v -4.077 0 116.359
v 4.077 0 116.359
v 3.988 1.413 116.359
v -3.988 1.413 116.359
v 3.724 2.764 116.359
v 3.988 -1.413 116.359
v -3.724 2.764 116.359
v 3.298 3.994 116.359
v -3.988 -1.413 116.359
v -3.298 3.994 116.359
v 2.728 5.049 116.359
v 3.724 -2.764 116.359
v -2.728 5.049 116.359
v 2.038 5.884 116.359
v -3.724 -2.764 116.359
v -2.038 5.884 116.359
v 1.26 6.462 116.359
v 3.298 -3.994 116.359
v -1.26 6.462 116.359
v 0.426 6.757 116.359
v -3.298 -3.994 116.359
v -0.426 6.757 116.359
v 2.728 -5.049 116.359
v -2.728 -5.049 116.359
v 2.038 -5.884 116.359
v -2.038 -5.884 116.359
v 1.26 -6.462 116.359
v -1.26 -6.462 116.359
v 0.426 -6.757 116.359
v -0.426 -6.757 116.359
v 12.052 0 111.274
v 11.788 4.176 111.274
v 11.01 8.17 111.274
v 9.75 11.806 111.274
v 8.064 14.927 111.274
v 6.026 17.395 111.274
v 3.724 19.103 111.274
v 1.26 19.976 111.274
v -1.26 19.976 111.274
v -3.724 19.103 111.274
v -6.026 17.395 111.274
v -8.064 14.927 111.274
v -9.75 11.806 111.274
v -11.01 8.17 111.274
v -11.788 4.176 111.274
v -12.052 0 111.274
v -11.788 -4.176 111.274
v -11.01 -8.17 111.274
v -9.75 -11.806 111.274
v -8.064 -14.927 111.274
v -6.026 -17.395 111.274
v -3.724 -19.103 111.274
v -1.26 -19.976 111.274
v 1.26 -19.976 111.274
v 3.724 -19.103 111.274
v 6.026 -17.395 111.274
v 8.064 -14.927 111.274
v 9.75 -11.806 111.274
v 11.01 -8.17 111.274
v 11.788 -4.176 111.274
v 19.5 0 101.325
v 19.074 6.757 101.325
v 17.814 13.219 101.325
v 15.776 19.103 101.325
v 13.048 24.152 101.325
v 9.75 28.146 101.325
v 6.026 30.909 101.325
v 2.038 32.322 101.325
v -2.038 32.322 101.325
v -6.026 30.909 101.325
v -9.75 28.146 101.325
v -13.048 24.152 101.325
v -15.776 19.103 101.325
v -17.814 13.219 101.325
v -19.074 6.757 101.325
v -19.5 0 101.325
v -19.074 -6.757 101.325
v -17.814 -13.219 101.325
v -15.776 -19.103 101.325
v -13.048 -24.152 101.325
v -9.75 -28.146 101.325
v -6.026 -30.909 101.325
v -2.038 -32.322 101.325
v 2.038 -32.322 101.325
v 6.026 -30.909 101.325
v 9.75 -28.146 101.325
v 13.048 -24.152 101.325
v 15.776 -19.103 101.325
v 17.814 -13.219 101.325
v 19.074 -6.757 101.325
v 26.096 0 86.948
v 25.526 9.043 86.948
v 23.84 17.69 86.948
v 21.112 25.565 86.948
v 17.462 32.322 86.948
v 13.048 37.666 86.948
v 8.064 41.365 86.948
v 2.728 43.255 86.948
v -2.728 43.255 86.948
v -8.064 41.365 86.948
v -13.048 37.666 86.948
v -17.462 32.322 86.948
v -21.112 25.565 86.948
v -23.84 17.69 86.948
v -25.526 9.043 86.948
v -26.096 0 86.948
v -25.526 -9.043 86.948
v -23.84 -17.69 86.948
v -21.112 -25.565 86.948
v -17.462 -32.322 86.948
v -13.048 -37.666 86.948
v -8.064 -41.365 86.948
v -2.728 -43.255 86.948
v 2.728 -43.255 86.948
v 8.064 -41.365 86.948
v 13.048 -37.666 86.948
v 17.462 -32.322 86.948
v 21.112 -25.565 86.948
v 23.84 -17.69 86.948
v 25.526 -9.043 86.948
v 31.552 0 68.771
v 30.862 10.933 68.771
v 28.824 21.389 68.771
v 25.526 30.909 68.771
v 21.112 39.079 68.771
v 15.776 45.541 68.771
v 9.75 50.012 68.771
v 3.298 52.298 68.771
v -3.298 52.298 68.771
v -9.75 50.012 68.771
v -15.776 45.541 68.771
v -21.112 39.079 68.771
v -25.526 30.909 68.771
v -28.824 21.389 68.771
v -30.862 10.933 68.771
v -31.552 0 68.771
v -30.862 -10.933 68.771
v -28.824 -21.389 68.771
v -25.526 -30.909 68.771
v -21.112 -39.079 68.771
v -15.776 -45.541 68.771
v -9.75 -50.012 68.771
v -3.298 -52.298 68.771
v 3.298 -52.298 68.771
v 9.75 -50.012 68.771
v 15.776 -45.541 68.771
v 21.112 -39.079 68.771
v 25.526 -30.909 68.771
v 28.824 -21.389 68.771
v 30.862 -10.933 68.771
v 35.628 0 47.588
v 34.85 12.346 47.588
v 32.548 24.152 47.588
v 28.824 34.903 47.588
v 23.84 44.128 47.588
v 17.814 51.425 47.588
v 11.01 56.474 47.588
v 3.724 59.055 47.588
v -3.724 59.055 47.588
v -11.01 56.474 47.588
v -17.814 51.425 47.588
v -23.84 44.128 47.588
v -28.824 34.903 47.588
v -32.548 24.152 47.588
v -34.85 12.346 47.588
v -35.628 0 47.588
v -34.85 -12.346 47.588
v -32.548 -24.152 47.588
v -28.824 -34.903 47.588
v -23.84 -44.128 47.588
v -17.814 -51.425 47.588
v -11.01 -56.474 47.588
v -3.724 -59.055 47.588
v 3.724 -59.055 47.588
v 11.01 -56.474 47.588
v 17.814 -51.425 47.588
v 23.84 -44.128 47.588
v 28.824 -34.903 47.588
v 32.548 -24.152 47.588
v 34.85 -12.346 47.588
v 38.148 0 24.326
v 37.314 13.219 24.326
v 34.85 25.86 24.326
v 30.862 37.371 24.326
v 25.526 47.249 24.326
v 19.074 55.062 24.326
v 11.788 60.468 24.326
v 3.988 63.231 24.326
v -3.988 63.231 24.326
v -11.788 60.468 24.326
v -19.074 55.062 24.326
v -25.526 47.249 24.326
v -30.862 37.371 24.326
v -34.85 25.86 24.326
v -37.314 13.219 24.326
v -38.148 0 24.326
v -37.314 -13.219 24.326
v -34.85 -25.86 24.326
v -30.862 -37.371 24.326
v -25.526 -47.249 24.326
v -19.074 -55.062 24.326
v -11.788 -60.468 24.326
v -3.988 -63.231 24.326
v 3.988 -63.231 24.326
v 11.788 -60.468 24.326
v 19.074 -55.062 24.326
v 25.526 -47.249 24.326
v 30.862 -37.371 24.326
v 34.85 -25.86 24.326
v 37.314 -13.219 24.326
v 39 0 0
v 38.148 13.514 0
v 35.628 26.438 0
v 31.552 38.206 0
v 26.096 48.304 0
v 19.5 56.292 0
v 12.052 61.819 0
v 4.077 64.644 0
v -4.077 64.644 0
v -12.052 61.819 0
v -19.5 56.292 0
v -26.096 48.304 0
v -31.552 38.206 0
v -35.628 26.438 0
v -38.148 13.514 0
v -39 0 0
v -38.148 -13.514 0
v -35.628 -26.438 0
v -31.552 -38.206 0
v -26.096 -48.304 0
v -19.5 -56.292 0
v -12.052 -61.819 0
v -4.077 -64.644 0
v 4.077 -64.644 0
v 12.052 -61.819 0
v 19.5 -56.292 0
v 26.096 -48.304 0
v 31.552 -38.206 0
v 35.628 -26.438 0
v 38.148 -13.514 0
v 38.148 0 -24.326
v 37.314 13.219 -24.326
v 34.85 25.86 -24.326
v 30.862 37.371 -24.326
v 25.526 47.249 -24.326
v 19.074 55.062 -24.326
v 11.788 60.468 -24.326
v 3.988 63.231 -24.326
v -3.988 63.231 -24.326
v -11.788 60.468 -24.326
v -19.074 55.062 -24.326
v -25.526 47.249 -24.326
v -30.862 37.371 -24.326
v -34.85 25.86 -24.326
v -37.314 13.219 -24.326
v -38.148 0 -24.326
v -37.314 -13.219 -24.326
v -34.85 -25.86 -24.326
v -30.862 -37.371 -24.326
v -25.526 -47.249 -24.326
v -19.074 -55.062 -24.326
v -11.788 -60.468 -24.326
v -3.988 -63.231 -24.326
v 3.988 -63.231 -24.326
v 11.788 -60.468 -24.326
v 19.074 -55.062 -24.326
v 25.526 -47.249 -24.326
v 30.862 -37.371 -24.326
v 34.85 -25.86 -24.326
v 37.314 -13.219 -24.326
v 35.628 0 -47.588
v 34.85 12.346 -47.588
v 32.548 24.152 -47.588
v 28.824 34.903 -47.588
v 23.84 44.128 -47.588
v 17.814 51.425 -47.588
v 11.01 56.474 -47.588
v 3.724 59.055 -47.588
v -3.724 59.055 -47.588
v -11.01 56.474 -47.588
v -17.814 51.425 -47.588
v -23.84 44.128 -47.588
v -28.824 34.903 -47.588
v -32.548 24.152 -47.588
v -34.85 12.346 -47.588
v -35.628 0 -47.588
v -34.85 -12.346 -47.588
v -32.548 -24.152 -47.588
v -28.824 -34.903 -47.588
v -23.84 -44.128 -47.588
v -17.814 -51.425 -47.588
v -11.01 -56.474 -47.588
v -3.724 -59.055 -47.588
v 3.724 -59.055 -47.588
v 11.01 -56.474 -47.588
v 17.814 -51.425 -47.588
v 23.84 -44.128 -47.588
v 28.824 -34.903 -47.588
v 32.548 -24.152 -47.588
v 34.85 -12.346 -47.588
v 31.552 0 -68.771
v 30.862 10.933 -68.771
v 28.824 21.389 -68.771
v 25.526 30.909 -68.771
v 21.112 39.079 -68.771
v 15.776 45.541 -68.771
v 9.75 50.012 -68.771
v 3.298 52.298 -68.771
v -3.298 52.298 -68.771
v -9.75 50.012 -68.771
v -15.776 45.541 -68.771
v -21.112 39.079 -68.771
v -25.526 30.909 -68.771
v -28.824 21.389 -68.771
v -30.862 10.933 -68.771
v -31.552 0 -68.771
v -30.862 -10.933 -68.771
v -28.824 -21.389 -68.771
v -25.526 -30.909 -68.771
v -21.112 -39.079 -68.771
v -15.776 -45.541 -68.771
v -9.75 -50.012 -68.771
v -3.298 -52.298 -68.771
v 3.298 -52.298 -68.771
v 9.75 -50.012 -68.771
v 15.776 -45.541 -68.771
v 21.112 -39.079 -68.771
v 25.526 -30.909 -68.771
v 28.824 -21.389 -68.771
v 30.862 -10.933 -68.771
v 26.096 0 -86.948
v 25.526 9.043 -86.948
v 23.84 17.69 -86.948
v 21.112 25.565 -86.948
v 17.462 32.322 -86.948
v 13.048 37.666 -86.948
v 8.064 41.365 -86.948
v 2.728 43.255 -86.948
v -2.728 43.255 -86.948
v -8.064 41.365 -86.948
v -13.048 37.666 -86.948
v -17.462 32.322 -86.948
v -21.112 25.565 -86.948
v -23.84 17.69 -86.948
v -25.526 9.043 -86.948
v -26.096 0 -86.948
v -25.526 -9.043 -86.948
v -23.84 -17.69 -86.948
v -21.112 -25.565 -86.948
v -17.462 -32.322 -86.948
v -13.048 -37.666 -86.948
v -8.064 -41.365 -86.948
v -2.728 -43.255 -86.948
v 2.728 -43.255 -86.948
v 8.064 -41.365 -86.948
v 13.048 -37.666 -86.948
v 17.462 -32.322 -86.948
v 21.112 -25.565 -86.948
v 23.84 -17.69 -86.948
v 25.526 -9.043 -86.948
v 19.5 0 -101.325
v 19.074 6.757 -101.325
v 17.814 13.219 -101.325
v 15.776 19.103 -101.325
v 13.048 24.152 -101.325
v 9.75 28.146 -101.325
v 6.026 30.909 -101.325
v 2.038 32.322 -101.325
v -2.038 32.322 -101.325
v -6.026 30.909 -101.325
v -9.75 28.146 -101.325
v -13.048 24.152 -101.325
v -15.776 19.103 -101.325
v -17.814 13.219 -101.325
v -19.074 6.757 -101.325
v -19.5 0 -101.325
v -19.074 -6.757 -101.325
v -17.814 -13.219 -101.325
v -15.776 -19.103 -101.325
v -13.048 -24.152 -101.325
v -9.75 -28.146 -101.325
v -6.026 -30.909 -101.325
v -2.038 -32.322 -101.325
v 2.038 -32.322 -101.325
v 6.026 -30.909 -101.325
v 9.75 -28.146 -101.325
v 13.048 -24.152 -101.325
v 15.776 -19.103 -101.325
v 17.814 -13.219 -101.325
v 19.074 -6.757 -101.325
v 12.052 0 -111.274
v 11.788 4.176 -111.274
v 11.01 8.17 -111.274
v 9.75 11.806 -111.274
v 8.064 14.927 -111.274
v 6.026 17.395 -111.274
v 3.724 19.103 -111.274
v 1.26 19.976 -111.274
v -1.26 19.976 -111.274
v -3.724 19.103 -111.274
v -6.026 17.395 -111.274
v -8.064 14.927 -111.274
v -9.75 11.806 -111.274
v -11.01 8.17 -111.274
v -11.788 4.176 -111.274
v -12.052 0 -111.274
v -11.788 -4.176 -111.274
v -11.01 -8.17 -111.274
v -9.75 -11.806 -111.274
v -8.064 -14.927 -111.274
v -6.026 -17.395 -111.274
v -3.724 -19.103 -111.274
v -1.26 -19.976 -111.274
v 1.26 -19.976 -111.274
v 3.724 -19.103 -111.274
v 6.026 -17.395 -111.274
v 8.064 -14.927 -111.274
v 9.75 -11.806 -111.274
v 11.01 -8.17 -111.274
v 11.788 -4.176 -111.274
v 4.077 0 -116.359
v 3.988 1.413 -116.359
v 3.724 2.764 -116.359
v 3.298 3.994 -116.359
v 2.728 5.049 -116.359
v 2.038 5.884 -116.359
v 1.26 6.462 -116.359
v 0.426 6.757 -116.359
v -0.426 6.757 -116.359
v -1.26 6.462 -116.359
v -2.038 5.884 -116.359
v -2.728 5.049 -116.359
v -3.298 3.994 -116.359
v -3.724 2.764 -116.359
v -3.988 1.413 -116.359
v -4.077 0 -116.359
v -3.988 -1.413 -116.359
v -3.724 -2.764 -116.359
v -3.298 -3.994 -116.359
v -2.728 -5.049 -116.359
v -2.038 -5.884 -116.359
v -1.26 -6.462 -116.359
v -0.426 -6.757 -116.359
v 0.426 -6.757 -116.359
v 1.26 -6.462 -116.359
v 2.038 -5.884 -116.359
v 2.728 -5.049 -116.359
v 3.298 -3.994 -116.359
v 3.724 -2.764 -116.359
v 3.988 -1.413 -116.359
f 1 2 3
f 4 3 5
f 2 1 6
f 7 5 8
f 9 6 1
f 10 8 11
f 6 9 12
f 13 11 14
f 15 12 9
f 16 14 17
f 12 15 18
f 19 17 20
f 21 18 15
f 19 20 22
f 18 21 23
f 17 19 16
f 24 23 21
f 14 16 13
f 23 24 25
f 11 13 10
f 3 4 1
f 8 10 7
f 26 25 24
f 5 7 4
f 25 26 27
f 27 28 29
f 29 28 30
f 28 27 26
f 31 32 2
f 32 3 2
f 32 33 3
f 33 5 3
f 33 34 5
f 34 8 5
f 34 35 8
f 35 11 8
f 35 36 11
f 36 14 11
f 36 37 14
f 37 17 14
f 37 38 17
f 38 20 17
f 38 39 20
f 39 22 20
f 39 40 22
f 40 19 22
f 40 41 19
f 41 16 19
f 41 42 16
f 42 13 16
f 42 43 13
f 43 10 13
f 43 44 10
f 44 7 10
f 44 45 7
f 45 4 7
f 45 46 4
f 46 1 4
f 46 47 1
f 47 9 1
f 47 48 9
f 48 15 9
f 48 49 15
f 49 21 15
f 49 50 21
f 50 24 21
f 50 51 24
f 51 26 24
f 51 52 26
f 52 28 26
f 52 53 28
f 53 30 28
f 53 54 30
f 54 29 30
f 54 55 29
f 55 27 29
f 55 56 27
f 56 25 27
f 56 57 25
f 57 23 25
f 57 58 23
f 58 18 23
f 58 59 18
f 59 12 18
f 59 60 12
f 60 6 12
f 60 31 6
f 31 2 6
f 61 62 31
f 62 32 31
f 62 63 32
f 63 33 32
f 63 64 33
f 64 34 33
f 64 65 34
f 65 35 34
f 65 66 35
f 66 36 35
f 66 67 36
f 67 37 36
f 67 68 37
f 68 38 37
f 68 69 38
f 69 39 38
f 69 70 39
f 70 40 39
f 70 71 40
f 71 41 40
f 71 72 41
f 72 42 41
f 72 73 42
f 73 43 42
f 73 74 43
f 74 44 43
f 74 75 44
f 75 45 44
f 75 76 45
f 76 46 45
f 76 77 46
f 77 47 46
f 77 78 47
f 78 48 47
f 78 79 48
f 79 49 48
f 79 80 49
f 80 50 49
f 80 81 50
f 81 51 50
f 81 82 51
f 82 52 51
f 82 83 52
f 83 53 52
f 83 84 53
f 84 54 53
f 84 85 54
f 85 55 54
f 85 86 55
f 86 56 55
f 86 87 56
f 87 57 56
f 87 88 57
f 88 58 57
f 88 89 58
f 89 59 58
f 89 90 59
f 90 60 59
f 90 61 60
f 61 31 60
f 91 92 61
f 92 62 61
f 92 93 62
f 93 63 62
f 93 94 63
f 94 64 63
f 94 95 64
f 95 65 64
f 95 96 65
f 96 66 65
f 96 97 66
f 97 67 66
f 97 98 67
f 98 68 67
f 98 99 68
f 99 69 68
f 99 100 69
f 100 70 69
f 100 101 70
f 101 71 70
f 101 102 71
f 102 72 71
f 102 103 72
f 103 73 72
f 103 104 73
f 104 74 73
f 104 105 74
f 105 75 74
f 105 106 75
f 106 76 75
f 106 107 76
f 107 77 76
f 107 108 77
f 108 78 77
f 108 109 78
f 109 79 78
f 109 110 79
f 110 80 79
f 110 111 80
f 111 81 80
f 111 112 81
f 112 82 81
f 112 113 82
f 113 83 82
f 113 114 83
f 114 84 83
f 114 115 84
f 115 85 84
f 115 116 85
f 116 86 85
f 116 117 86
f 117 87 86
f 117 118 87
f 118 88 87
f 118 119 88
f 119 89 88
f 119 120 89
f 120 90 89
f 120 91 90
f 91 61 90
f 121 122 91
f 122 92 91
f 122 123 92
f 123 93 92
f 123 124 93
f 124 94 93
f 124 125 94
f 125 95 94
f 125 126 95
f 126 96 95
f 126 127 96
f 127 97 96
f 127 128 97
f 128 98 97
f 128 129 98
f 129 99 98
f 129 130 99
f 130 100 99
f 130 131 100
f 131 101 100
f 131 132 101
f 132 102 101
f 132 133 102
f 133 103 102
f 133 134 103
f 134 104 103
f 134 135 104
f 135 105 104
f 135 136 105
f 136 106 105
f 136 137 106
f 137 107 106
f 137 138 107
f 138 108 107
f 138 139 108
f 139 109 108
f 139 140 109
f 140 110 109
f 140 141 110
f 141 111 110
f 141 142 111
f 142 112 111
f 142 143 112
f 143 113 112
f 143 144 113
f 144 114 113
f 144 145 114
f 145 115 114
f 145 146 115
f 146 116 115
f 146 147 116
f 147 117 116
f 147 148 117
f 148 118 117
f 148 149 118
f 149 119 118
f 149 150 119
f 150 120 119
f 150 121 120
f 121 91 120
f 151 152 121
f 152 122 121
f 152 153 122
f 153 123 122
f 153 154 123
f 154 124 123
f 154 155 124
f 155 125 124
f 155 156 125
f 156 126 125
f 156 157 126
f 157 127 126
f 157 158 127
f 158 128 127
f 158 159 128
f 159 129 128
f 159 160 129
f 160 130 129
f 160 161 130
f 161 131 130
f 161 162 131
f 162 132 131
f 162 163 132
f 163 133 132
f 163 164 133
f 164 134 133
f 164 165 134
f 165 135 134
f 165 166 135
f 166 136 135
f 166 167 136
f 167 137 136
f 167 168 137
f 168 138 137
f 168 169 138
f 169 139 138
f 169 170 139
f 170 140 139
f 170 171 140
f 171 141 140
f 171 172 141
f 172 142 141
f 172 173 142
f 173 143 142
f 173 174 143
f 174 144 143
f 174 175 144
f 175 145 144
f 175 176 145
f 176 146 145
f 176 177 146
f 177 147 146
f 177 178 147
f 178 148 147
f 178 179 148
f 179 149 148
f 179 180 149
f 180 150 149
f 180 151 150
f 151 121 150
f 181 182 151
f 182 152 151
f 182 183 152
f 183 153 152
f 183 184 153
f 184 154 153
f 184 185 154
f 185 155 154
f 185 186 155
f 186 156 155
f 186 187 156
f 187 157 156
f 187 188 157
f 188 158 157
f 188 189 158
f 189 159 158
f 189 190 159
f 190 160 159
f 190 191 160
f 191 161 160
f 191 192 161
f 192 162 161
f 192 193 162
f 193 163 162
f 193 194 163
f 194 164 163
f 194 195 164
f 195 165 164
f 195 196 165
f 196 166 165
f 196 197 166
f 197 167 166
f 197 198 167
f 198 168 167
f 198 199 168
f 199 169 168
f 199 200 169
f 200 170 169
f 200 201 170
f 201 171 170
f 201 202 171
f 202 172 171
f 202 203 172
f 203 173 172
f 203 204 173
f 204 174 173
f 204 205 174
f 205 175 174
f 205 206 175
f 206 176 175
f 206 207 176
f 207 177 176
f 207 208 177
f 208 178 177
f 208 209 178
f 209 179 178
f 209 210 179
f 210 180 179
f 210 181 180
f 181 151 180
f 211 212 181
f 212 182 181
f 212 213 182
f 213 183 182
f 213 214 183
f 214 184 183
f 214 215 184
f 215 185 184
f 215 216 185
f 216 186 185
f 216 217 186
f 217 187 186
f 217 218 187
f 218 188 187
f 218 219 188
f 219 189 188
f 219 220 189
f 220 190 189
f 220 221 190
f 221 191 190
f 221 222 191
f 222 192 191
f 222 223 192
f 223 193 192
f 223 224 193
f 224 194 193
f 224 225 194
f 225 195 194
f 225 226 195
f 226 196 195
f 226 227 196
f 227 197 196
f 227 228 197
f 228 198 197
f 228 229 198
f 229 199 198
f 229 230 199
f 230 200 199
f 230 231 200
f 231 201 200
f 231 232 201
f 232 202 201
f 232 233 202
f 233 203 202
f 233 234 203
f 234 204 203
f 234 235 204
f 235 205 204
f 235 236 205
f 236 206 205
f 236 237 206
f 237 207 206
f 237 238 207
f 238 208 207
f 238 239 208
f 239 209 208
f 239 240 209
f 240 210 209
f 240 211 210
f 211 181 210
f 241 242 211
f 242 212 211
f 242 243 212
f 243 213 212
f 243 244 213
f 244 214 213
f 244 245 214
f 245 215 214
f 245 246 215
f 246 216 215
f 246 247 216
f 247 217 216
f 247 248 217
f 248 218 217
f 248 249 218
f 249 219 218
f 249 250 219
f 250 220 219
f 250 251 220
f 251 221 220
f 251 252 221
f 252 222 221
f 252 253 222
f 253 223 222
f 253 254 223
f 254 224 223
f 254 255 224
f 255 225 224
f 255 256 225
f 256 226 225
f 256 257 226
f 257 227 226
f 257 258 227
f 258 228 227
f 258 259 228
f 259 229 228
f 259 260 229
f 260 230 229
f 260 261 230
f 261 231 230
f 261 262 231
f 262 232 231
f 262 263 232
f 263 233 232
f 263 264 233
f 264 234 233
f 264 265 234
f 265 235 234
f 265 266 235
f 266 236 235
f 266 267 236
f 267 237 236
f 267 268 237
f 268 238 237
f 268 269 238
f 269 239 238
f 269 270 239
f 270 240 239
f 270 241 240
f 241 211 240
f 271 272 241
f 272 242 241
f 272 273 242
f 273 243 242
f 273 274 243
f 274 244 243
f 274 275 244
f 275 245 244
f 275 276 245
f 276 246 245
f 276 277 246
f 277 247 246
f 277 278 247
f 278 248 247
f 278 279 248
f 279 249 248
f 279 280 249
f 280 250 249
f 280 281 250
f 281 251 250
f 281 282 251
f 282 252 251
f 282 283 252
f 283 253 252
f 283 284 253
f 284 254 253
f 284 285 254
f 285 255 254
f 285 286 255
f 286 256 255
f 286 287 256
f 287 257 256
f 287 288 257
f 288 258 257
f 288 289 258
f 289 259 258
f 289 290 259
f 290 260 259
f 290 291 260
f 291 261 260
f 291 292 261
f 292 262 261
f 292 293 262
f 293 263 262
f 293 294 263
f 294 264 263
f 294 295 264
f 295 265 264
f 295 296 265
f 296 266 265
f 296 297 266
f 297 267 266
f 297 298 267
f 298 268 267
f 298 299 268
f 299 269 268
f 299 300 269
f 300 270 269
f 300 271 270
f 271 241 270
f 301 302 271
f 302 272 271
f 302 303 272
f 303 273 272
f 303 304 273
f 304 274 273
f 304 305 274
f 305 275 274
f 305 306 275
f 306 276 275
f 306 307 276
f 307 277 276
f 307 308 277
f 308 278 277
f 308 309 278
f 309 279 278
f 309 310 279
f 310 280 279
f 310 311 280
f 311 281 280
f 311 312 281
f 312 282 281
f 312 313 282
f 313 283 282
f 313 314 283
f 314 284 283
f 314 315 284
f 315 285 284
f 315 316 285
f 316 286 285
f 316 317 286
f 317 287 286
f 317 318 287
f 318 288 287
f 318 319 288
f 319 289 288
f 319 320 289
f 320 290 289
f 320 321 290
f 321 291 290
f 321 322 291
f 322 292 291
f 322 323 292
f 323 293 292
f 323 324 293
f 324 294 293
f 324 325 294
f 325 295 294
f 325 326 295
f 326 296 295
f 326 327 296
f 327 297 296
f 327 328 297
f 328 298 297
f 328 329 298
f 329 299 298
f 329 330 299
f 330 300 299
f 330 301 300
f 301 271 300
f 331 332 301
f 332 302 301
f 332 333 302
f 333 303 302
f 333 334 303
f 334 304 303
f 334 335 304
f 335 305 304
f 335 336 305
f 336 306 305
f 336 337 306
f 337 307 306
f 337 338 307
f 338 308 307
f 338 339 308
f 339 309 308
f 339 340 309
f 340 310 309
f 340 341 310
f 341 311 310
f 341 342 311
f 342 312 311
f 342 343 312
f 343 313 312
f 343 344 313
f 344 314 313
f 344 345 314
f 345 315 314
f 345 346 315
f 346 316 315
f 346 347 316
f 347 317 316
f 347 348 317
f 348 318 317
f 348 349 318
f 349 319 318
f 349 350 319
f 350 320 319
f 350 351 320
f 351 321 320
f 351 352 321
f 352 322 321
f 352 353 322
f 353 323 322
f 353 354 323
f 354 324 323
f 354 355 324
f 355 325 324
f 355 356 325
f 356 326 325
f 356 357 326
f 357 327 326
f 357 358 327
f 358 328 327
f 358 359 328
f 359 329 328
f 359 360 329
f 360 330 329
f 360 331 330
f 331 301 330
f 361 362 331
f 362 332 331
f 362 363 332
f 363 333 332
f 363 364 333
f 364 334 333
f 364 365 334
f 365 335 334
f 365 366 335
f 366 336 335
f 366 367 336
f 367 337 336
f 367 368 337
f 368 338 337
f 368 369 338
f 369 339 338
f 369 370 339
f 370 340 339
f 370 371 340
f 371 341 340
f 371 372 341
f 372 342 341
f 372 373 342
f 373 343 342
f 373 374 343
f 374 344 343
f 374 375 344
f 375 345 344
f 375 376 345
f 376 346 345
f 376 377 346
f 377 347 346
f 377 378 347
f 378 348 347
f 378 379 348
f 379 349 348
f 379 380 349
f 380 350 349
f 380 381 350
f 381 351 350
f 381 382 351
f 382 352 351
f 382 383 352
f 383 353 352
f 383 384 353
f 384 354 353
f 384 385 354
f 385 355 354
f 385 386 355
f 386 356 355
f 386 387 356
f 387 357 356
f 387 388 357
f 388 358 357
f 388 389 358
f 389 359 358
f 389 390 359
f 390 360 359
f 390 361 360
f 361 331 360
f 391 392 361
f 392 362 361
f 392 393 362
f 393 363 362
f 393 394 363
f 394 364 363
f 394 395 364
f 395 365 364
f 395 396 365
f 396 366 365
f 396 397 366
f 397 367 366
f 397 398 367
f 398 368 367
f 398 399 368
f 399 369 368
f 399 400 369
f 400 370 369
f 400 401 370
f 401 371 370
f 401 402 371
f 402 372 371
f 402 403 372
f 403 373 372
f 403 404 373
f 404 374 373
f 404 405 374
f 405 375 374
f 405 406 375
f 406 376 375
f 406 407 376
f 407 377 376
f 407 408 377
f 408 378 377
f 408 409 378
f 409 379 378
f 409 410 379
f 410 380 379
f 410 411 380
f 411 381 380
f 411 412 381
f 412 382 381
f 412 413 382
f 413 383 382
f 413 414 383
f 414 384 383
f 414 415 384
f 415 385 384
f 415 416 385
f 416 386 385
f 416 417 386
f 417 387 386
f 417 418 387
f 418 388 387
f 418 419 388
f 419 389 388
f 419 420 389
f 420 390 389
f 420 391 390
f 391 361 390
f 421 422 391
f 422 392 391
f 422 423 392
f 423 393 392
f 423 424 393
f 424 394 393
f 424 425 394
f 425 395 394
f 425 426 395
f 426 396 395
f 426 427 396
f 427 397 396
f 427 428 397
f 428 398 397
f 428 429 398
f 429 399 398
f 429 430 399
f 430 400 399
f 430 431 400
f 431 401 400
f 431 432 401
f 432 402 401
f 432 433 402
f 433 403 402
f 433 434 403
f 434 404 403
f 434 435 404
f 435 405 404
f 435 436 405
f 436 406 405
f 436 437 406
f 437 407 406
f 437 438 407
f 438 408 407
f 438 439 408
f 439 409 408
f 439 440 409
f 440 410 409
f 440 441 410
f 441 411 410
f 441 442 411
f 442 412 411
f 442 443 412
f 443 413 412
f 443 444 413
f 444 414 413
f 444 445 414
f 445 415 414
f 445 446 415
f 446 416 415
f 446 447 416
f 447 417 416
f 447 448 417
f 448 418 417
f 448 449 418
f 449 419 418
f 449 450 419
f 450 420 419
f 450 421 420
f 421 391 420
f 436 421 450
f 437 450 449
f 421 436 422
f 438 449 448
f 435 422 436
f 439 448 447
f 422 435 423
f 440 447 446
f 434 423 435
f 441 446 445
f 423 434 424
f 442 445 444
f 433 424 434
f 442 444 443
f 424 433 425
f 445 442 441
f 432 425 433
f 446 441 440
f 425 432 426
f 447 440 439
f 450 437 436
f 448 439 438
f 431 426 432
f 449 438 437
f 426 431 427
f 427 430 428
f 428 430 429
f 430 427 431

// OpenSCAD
// Generated by SolidPython 1.0.1 on 2020-07-29 00:46:45


scale(v = [3, 5, 9]) {
	sphere(r = 13);
}
/***********************************************
*********      SolidPython code:      **********
************************************************
 
# import packages: SolidPython
from solid import *
from solid.utils import *
from itertools import chain, combinations, permutations


class Resize:

    def __init__(self, scad_file):
        self.scad_file = scad_file
        #self.scad_file = import_scad(scad_file)
        # cone/cylinder param:
        self.r1 = 0
        self.r2 = 0
        self.h = 0
        # rectangular prism param:
        self.w = 0
        self.l = 0
        # ellipse param:
        self.r = 0

    # import OpenScad code (file name corresponds to shape)


    # classify shape + parameters
    def assign(self, param1, param2, param3):
        if self.scad_file == 'cone.scad':
            self.r1 = param1
            self.r2 = param2
            self.h = param3
        elif self.scad_file == 'cylinder.scad':
            self.r1 = param1
            self.r2 = param2
            self.h = param3
        elif self.scad_file == 'rectangularPrism.scad':
            self.h = param1
            self.l = param2
            self.w = param3
        else:
            self.r = param1
            self.h = param2

    # resize parameters
    def iterate(self):
        x = range(3, 20, 2)
        i = 1
        if self.scad_file == 'cone.scad':
            tempList = list(permutations(x, 2))
            for temp in tempList:
                param1 = temp[0]
                param2 = temp[1]
                filepath = 'produced_scad_files/' + 'cone' + str(param1) + '_' + str(param2) + '_' + '.scad'
                scad_render_to_file(cylinder(h=param1, r1=param2, r2=0), filepath)

        elif self.scad_file == 'cylinder.scad':
            tempList = list(permutations(x, 3))
            for temp in tempList:
                param1 = temp[0]
                param2 = temp[1]
                filepath = 'produced_scad_files/' + 'cylinder' + str(param1) + '_' + str(param2) + '_' + '.scad'
                scad_render_to_file(cylinder(h=param1, r1=param2, r2=param2), filepath)

        elif self.scad_file == 'rectangularPrism.scad':
            tempList = list(permutations(x, 3))
            for temp in tempList:
                param1 = temp[0]
                param2 = temp[1]
                param3 = temp[2]
                filepath = 'produced_scad_files/' + 'rectangularPrism' + str(param1) + '_' + str(param2) + '_' + str(
                    param3) + '.scad'
                scad_render_to_file(cube(size=(param1, param2, param3)), filepath)

        elif self.scad_file == 'ellipse.scad':
            tempList = list(permutations(x, 4))
            for temp in tempList:
                param1 = temp[0]
                param2 = temp[1]
                param3 = temp[2]
                param4 = temp[3]
                filepath = 'produced_scad_files/' + 'ellipse' + str(param1) + '_' + str(param2) + '_' + str(param3) + '_' + str(param4) + '.scad'
                scad_render_to_file(scale([param1, param2, param3])(sphere(r=param4)), filepath)

    def render_to_scadfile(self):
        scad_render_to_file(scad, 'example.scad') 
 
************************************************/
